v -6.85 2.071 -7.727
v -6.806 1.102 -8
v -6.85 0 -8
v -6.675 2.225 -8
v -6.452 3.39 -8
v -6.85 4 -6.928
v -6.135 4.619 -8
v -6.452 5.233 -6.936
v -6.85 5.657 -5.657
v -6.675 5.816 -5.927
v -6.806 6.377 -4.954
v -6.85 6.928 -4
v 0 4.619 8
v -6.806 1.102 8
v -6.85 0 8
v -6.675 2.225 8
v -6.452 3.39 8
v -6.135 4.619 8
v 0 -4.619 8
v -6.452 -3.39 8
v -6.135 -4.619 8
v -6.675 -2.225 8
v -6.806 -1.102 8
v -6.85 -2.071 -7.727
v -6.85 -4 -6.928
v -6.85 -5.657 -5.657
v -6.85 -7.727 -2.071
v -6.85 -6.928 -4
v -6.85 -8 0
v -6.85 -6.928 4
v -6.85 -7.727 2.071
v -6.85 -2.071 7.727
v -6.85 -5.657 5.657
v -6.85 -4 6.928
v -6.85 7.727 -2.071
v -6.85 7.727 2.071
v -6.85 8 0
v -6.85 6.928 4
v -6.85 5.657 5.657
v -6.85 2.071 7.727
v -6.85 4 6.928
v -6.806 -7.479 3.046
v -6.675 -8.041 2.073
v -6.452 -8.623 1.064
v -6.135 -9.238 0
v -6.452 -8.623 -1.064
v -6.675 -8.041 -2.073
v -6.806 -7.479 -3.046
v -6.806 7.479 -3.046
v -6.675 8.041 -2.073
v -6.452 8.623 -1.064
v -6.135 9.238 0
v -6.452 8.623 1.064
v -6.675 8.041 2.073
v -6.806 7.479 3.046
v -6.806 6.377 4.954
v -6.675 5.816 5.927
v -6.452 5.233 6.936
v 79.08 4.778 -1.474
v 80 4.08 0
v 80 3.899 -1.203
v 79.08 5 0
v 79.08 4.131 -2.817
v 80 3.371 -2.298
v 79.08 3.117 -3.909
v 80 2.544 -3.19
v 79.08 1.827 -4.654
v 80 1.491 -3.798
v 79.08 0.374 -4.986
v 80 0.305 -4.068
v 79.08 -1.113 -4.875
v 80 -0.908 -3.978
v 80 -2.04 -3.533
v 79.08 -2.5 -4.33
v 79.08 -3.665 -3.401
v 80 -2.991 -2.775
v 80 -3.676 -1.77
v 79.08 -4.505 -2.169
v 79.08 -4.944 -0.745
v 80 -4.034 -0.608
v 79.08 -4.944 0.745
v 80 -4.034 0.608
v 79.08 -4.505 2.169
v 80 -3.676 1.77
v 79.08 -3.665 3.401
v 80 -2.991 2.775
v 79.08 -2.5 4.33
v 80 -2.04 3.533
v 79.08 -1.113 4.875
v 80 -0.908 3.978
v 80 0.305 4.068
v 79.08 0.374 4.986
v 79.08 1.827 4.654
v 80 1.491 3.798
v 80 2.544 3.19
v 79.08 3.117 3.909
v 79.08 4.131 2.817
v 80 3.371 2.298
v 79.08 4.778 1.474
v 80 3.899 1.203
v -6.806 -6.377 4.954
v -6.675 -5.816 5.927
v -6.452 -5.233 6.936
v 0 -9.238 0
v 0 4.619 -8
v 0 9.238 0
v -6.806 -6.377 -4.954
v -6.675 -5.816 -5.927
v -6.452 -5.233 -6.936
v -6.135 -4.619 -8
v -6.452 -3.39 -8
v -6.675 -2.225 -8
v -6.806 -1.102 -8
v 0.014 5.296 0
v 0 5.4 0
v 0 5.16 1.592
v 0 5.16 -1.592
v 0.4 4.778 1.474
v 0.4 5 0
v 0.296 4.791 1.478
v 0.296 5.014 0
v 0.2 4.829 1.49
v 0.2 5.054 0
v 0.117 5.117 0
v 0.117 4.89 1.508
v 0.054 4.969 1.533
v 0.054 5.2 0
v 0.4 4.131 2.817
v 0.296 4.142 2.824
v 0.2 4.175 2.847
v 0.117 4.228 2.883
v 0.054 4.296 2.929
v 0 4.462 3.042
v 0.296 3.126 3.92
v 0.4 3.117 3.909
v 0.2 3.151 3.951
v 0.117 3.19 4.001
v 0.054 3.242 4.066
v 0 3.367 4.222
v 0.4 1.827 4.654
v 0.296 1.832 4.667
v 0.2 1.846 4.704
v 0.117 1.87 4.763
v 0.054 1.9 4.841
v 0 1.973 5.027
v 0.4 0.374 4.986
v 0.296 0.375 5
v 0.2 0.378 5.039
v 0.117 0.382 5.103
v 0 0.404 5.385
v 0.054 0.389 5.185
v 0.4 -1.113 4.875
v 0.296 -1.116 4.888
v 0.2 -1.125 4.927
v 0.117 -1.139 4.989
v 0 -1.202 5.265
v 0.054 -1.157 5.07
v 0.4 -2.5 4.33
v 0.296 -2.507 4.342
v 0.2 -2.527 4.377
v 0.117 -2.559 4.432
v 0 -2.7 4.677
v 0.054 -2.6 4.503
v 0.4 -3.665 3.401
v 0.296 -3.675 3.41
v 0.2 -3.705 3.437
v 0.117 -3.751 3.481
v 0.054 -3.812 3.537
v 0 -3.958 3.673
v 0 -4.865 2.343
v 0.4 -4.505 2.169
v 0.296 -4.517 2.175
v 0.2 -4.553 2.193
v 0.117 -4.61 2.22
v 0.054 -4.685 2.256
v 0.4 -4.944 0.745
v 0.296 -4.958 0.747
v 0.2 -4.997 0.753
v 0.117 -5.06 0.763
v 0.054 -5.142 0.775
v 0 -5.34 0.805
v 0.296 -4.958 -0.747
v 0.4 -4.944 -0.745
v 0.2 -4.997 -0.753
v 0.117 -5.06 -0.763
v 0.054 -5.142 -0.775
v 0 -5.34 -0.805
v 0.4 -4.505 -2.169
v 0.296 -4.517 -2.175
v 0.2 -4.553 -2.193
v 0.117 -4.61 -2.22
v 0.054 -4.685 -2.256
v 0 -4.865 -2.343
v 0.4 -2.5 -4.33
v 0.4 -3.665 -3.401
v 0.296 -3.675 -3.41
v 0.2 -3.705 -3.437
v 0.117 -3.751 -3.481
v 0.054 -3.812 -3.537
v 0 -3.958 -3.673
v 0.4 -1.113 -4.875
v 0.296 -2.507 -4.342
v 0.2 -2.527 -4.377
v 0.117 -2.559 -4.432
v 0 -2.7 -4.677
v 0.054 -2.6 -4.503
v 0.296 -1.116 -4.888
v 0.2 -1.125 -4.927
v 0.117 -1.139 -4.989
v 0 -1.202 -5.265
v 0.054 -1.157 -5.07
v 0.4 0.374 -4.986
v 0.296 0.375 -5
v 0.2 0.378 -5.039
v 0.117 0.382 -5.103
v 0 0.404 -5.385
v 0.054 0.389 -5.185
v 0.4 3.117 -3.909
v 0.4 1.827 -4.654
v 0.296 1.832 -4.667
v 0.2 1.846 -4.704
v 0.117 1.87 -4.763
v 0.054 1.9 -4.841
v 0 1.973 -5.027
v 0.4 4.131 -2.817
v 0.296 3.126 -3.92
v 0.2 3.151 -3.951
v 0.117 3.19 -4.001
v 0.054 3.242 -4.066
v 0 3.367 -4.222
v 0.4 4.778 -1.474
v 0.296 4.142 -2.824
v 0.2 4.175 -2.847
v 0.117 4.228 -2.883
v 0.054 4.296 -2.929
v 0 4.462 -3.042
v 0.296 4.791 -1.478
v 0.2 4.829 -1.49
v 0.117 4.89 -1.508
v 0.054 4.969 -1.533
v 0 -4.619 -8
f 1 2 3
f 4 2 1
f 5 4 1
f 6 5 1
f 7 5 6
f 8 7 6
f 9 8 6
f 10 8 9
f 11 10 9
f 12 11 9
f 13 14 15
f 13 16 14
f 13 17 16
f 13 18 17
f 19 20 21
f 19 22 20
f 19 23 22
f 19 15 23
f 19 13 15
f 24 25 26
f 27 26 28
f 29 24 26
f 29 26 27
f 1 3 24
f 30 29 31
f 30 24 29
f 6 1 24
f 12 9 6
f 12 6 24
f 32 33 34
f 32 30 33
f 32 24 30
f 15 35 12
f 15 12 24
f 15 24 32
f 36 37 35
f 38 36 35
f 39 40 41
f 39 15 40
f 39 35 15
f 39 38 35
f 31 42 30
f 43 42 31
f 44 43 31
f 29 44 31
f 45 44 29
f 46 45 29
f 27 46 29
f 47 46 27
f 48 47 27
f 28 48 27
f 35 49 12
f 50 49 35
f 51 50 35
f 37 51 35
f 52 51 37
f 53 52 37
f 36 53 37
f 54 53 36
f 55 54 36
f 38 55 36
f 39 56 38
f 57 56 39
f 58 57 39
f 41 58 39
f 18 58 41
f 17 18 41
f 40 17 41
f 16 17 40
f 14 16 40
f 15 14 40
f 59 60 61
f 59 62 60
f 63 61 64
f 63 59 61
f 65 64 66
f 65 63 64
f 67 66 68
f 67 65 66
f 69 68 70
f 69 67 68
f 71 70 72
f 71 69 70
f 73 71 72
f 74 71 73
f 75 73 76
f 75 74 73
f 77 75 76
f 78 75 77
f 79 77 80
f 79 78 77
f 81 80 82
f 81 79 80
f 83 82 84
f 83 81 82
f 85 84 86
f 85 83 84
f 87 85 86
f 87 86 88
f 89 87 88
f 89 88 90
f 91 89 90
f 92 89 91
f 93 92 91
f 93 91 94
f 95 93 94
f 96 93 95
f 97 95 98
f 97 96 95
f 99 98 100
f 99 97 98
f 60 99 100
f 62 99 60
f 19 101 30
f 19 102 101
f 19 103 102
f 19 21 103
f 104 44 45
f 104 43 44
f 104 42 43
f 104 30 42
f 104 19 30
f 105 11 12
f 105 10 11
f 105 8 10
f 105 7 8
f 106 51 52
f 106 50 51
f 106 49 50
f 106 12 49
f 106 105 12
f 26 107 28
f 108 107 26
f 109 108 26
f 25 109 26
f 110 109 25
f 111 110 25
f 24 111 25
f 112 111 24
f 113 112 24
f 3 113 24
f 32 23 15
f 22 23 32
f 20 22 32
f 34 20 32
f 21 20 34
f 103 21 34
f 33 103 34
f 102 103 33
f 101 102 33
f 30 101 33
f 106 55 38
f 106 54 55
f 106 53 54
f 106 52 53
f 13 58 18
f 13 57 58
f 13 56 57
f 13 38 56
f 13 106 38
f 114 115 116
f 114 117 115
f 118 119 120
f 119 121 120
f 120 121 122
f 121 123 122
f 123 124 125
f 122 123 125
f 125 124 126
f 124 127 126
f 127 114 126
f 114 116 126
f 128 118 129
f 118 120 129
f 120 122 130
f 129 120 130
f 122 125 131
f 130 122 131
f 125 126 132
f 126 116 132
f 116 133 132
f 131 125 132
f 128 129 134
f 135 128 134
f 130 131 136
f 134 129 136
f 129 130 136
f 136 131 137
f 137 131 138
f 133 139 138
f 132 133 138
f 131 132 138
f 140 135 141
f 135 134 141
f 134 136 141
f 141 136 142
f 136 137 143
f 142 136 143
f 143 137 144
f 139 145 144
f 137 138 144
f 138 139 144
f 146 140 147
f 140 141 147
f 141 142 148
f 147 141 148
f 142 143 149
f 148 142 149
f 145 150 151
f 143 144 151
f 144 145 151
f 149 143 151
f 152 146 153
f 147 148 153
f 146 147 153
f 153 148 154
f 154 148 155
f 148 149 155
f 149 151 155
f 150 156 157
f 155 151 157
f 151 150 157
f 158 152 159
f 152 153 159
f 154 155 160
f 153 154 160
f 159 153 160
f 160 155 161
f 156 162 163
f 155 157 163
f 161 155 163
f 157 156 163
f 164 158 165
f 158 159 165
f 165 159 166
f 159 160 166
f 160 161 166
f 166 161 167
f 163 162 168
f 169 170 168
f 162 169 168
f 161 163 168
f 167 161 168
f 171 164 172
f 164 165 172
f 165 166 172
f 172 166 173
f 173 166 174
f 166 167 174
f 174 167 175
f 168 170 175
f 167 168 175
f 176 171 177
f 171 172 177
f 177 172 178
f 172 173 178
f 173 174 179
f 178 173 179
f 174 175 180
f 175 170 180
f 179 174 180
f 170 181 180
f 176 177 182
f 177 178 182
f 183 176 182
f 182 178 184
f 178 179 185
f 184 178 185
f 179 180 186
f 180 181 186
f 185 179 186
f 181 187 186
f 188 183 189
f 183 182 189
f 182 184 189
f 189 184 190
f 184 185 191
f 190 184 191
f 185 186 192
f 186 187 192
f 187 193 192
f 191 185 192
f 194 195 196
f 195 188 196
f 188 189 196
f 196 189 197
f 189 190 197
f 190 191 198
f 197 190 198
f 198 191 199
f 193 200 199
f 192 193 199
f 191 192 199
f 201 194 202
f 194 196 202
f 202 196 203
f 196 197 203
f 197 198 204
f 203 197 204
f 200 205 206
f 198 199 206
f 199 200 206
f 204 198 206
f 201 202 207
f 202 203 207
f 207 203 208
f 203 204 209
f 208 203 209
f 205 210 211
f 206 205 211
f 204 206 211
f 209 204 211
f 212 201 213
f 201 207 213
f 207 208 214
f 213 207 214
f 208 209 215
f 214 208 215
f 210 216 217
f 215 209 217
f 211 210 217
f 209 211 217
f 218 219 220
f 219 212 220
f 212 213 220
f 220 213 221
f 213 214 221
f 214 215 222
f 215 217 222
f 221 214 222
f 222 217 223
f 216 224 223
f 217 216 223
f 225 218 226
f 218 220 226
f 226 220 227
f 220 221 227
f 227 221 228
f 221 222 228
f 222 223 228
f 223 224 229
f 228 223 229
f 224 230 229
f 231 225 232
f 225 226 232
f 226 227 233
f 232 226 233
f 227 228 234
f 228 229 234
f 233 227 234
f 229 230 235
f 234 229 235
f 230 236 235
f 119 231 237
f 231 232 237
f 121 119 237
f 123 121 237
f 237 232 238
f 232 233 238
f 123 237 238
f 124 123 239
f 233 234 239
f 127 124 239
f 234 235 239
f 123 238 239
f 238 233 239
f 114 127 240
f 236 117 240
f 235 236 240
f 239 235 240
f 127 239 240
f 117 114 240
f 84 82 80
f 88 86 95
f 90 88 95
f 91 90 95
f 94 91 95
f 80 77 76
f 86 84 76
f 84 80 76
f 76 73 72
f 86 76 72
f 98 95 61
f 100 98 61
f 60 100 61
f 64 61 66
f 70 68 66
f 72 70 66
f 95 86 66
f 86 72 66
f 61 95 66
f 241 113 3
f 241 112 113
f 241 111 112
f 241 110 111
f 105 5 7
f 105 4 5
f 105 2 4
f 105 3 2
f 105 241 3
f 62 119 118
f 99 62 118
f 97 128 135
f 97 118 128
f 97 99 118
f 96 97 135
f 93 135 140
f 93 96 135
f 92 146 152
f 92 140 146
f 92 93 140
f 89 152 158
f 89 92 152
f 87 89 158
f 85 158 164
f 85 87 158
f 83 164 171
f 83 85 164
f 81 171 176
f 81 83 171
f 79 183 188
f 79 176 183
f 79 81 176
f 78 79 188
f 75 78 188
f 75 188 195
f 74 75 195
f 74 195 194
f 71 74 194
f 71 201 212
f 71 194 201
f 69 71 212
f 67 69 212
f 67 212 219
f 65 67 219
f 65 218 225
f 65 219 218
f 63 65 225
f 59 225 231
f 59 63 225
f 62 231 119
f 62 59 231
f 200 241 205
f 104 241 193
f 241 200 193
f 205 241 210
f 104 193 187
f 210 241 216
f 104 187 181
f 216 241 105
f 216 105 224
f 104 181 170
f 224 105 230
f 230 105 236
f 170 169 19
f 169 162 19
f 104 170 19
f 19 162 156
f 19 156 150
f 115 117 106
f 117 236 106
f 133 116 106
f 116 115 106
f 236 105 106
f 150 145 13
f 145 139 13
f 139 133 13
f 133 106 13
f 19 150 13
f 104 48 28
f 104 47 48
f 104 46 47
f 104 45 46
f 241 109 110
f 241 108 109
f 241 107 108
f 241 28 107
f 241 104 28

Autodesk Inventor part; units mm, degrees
ref_plane "YZ Plane" through (0, 0, 0) normal (1, 0, 0) x (0, 1, 0)
ref_plane "XZ Plane" through (0, 0, 0) normal (0, 1, 0) x (-1, 0, 0)
sketch "Эскиз1" plane through (0, 0, 0) normal (0, 0, 1) x (1, 0, 0)
  line L0 (0, 5) -> (80, 5)
  line L1 (80, 5) -> (80, 0)
  line L2 (80, 0) -> (0, 0)
  line L3 (-16, 0) -> (96, 0) projected
  line L4 (0, -1) -> (0, 6) projected
  line L5 (0, 5) -> (0, 0)
  dimension "d2" = 10
  dimension "d59" = 80
revolve "Базовый элемент" add sketch "Эскиз1" angle 360 about axis through (80, 0, 0) along (-1, 0, 0)
sketch "Эскиз2" plane through (0, 0, 0) normal (-1, 0, 0) x (0, 0, 1)
  line L0 (0, 9.2376) -> (8, 4.6188)
  line L1 (8, 4.6188) -> (8, -4.6188)
  line L2 (8, -4.6188) -> (0, -9.2376)
  line L3 (0, -9.2376) -> (-8, -4.6188)
  line L4 (-8, -4.6188) -> (-8, 4.6188)
  line L5 (-8, 4.6188) -> (0, 9.2376)
  line L6 (-11.2, 0) -> (11.2, 0) projected
  line L7 (0, 12.9326) -> (0, -12.9326) projected
  point P0 (0, 0)
  point P1 (0, 0)
  dimension "d11" = 16
extrude "С головкой" add sketch "Эскиз2" along normal blind 6.85
sketch "Эскиз4" plane through (0, 0, 0) normal (0, 0, 1) x (1, 0, 0)
  line L0 (-5.9262, 9.6) -> (-6.85, 8)
  line L1 (-1.1, 0) -> (-0.234, 0)
  line L2 (-8.1732, 0) -> (1.0892, 0) projected
  line L3 (-6.85, 9.6) -> (-5.9262, 9.6)
  line L4 (-6.85, 8) -> (-6.85, 9.6)
  line L5 (0, 11.52) -> (0, -1.92) projected
  dimension "d65" = 16
  dimension "d67" = 30
  dimension "d68" = 19.2
  dimension "d69" = 6.85
revolve "Фаска1" cut sketch "Эскиз4" angle 360 about axis through (-1.1, 0, 0) along (1, 0, 0)
thread "Резьба" size "M10x1.5" class "6g" standard "ISO Metric profile" length 26
chamfer "Фаска2" distance 0.9202 distance2 0.9203 1 edges at (80, -5, 0) measured on face at (80, 0.2493, 1.2557)
fillet "Fillet" radius 0.4 1 edges at (0, -5, 0)
ref_plane "Work Plane1" through (1.525, 0, 0) normal (0, 0, 1) x (1, 0, 0)
equation "\"d2\" = GD"
equation "\"d59\" = NLG"
equation "\"d11\" = SW"
equation "\"d3\" = KOH"
equation "\"d71\" = RR1"
equation "\"d15\" = GEL"
equation "\"d6\" = -0.5 * SPD + 0.5 * GD"
equation "\"d65\" = SW"
equation "\"d67\" = ANG1"
equation "\"d68\" = 1.2 * SW"
equation "\"d69\" = KOH"
equation "\"NLG\" = 80"
equation "\"GD\" = NND"
equation "\"KOH\" = 6.85"
equation "\"GEL\" = 26"
equation "\"SW\" = 16"
equation "\"SW0\" = SW"
equation "\"SPD\" = NND - 1.2269 * PTC"
equation "\"SD\" = 0"
equation "\"ANG1\" = 30deg"
equation "\"GAL\" = 0.61345 * PTC"
equation "\"GUL\" = 0.61345 * PTC"
equation "\"RR\" = 0.1"
equation "\"RR1\" = 0.4"
equation "\"GD1\" = THREADDIA - 1.2269 * PTC"
equation "\"TOA\" = 30deg"
equation "\"PTC\" = 1.5"
equation "\"KOH1\" = 4.5"
equation "\"E0\" = 1.155 * SW"
equation "\"NND\" = 10"
equation "\"THREADDIA\" = 10"
properties part number "ANSI B18.2.3.5M - M10 x 1,5 x 80" material "Сталь, мягкая"
